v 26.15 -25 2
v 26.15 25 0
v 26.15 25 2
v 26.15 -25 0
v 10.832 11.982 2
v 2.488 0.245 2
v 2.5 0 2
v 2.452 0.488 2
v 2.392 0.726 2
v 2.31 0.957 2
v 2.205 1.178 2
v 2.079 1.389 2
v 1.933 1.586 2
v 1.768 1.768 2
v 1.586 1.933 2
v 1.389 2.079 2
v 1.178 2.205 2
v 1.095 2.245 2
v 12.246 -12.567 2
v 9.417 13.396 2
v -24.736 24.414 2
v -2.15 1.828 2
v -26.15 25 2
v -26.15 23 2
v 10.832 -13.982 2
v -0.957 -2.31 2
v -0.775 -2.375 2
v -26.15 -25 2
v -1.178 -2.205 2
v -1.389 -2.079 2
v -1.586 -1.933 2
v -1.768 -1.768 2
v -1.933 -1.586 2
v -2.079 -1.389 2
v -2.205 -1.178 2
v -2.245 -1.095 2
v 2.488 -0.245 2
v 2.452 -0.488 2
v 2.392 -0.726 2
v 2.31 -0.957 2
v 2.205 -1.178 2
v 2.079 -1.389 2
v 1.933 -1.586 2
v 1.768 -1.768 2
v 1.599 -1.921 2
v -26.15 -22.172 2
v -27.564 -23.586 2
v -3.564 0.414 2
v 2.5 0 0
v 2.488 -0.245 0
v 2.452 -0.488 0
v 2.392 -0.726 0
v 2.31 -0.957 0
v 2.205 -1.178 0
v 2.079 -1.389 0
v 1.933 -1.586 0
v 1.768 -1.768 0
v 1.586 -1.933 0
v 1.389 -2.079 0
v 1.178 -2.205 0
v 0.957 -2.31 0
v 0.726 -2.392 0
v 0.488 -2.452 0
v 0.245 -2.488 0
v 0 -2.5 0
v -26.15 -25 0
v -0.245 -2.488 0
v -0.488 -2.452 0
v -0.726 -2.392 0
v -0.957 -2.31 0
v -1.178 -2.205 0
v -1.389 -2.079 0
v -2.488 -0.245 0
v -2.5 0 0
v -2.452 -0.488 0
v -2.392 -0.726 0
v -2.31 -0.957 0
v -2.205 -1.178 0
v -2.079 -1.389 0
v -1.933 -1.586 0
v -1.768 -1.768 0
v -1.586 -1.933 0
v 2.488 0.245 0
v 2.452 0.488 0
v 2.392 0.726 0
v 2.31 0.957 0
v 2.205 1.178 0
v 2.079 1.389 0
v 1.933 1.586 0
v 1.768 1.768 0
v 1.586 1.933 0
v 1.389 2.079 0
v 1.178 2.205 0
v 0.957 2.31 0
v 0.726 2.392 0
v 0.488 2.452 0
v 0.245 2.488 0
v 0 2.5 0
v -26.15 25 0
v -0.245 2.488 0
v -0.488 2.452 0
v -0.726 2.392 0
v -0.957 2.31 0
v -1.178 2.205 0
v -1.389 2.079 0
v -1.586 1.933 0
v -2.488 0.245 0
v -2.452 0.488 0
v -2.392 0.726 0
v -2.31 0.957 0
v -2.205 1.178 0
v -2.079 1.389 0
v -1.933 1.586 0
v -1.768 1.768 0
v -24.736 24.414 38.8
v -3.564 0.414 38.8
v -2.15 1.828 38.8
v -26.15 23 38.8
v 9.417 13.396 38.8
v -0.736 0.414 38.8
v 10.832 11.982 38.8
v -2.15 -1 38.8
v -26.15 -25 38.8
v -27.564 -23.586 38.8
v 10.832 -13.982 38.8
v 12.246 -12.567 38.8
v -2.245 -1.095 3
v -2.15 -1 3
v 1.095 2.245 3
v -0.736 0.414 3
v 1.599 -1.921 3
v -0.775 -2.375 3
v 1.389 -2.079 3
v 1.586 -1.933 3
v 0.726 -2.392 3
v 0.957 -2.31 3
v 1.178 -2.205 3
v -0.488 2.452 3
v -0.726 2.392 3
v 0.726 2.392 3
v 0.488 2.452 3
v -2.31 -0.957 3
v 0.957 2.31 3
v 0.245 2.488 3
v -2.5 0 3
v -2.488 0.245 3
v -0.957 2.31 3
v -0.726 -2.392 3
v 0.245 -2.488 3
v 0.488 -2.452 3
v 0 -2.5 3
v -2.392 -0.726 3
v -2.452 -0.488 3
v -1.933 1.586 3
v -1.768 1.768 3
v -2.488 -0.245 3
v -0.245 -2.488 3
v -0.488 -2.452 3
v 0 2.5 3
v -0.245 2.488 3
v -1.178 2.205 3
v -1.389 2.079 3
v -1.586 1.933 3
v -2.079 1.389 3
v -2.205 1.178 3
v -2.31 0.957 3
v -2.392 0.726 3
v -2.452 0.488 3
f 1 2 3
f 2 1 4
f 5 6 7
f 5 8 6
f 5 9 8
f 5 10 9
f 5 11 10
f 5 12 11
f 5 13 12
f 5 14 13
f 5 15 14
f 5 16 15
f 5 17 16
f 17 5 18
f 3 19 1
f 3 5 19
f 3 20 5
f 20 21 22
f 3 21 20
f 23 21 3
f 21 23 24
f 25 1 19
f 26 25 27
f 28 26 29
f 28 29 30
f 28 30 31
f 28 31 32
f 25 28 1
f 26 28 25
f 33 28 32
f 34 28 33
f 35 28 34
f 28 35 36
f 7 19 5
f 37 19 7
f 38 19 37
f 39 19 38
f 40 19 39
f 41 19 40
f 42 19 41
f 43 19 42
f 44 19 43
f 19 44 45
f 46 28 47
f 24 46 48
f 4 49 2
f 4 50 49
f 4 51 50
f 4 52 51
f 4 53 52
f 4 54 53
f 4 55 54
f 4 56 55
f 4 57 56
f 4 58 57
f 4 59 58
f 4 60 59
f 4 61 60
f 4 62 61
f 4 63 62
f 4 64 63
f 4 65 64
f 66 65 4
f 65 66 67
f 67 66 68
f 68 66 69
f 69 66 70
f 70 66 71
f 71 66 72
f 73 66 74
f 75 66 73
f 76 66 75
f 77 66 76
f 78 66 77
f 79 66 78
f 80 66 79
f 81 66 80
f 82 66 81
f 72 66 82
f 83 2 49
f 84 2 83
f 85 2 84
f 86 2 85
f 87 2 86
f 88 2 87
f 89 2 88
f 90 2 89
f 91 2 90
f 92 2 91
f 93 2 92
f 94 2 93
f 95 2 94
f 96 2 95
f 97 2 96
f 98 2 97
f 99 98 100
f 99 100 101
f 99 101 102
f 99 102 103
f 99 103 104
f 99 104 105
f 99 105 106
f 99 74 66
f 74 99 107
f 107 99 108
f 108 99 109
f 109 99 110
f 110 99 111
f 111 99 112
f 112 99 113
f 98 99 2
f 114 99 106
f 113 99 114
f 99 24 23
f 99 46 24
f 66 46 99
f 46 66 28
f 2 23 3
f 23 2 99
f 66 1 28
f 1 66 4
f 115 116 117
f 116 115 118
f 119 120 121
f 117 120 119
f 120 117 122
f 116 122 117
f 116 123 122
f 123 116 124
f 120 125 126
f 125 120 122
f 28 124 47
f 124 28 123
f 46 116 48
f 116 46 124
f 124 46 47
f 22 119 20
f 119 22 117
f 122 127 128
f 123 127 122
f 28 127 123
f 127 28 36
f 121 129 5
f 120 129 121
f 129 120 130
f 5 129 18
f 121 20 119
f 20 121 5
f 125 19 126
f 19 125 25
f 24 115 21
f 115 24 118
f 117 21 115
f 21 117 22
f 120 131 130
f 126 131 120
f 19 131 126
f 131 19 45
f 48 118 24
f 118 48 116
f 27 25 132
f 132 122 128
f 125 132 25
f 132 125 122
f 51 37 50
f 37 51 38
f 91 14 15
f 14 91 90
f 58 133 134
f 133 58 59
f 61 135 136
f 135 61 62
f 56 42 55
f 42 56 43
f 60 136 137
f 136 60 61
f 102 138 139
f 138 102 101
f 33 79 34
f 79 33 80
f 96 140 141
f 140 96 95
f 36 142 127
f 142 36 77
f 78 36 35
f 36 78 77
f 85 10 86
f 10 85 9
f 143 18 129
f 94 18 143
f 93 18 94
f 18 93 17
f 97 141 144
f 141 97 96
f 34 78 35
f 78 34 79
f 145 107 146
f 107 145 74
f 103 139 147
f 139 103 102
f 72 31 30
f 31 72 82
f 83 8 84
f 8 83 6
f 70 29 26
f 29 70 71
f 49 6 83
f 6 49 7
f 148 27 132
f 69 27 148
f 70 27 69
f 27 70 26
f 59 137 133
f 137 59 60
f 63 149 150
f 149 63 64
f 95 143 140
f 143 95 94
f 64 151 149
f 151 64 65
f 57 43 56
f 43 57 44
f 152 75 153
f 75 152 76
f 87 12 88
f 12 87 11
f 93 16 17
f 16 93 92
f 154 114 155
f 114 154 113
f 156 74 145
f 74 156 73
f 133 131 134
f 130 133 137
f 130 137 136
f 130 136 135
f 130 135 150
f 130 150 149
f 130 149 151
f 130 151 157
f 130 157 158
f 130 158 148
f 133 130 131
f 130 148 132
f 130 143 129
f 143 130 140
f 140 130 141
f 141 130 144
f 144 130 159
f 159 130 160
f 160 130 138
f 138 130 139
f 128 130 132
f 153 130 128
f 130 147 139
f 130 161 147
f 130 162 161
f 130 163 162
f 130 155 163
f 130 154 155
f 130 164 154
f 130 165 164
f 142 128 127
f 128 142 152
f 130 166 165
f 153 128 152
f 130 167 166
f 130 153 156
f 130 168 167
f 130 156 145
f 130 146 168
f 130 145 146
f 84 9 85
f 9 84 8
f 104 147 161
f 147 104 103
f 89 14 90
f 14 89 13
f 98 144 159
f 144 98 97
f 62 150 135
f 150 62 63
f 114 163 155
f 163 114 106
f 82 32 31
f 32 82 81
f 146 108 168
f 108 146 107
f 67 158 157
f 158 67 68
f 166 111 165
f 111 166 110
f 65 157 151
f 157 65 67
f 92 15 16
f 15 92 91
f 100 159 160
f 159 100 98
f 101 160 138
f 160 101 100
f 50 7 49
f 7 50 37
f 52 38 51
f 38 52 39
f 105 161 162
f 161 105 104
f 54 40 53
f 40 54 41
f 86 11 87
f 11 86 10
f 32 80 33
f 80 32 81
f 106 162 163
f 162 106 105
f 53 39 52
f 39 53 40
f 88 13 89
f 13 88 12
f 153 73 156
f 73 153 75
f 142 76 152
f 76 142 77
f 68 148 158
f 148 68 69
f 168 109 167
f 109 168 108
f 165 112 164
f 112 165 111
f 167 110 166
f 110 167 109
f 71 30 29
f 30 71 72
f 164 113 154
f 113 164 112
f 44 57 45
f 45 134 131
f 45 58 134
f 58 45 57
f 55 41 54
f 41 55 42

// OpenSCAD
module bracket() {
    difference() {
        union() {
            // Base plate
            translate([-26.15, -25, 0])
                cube([52.3, 50, 2]);

            // Side walls
            translate([-26.15, -25, 2])
                rotate([0, 0, 45])
                cube([52.3, 2, 36.8]);
            translate([-26.15, 23, 2])
                rotate([0, 0, -45])
                cube([52.3, 2, 36.8]);

            // Mounting tab
            translate([-10, -5, 0])
                cube([20, 10, 2]);
        }

        // Hole in the mounting tab
        translate([0, 0, -1])
            cylinder(h=4, d=5, $fn=64);
    }
}

bracket();
